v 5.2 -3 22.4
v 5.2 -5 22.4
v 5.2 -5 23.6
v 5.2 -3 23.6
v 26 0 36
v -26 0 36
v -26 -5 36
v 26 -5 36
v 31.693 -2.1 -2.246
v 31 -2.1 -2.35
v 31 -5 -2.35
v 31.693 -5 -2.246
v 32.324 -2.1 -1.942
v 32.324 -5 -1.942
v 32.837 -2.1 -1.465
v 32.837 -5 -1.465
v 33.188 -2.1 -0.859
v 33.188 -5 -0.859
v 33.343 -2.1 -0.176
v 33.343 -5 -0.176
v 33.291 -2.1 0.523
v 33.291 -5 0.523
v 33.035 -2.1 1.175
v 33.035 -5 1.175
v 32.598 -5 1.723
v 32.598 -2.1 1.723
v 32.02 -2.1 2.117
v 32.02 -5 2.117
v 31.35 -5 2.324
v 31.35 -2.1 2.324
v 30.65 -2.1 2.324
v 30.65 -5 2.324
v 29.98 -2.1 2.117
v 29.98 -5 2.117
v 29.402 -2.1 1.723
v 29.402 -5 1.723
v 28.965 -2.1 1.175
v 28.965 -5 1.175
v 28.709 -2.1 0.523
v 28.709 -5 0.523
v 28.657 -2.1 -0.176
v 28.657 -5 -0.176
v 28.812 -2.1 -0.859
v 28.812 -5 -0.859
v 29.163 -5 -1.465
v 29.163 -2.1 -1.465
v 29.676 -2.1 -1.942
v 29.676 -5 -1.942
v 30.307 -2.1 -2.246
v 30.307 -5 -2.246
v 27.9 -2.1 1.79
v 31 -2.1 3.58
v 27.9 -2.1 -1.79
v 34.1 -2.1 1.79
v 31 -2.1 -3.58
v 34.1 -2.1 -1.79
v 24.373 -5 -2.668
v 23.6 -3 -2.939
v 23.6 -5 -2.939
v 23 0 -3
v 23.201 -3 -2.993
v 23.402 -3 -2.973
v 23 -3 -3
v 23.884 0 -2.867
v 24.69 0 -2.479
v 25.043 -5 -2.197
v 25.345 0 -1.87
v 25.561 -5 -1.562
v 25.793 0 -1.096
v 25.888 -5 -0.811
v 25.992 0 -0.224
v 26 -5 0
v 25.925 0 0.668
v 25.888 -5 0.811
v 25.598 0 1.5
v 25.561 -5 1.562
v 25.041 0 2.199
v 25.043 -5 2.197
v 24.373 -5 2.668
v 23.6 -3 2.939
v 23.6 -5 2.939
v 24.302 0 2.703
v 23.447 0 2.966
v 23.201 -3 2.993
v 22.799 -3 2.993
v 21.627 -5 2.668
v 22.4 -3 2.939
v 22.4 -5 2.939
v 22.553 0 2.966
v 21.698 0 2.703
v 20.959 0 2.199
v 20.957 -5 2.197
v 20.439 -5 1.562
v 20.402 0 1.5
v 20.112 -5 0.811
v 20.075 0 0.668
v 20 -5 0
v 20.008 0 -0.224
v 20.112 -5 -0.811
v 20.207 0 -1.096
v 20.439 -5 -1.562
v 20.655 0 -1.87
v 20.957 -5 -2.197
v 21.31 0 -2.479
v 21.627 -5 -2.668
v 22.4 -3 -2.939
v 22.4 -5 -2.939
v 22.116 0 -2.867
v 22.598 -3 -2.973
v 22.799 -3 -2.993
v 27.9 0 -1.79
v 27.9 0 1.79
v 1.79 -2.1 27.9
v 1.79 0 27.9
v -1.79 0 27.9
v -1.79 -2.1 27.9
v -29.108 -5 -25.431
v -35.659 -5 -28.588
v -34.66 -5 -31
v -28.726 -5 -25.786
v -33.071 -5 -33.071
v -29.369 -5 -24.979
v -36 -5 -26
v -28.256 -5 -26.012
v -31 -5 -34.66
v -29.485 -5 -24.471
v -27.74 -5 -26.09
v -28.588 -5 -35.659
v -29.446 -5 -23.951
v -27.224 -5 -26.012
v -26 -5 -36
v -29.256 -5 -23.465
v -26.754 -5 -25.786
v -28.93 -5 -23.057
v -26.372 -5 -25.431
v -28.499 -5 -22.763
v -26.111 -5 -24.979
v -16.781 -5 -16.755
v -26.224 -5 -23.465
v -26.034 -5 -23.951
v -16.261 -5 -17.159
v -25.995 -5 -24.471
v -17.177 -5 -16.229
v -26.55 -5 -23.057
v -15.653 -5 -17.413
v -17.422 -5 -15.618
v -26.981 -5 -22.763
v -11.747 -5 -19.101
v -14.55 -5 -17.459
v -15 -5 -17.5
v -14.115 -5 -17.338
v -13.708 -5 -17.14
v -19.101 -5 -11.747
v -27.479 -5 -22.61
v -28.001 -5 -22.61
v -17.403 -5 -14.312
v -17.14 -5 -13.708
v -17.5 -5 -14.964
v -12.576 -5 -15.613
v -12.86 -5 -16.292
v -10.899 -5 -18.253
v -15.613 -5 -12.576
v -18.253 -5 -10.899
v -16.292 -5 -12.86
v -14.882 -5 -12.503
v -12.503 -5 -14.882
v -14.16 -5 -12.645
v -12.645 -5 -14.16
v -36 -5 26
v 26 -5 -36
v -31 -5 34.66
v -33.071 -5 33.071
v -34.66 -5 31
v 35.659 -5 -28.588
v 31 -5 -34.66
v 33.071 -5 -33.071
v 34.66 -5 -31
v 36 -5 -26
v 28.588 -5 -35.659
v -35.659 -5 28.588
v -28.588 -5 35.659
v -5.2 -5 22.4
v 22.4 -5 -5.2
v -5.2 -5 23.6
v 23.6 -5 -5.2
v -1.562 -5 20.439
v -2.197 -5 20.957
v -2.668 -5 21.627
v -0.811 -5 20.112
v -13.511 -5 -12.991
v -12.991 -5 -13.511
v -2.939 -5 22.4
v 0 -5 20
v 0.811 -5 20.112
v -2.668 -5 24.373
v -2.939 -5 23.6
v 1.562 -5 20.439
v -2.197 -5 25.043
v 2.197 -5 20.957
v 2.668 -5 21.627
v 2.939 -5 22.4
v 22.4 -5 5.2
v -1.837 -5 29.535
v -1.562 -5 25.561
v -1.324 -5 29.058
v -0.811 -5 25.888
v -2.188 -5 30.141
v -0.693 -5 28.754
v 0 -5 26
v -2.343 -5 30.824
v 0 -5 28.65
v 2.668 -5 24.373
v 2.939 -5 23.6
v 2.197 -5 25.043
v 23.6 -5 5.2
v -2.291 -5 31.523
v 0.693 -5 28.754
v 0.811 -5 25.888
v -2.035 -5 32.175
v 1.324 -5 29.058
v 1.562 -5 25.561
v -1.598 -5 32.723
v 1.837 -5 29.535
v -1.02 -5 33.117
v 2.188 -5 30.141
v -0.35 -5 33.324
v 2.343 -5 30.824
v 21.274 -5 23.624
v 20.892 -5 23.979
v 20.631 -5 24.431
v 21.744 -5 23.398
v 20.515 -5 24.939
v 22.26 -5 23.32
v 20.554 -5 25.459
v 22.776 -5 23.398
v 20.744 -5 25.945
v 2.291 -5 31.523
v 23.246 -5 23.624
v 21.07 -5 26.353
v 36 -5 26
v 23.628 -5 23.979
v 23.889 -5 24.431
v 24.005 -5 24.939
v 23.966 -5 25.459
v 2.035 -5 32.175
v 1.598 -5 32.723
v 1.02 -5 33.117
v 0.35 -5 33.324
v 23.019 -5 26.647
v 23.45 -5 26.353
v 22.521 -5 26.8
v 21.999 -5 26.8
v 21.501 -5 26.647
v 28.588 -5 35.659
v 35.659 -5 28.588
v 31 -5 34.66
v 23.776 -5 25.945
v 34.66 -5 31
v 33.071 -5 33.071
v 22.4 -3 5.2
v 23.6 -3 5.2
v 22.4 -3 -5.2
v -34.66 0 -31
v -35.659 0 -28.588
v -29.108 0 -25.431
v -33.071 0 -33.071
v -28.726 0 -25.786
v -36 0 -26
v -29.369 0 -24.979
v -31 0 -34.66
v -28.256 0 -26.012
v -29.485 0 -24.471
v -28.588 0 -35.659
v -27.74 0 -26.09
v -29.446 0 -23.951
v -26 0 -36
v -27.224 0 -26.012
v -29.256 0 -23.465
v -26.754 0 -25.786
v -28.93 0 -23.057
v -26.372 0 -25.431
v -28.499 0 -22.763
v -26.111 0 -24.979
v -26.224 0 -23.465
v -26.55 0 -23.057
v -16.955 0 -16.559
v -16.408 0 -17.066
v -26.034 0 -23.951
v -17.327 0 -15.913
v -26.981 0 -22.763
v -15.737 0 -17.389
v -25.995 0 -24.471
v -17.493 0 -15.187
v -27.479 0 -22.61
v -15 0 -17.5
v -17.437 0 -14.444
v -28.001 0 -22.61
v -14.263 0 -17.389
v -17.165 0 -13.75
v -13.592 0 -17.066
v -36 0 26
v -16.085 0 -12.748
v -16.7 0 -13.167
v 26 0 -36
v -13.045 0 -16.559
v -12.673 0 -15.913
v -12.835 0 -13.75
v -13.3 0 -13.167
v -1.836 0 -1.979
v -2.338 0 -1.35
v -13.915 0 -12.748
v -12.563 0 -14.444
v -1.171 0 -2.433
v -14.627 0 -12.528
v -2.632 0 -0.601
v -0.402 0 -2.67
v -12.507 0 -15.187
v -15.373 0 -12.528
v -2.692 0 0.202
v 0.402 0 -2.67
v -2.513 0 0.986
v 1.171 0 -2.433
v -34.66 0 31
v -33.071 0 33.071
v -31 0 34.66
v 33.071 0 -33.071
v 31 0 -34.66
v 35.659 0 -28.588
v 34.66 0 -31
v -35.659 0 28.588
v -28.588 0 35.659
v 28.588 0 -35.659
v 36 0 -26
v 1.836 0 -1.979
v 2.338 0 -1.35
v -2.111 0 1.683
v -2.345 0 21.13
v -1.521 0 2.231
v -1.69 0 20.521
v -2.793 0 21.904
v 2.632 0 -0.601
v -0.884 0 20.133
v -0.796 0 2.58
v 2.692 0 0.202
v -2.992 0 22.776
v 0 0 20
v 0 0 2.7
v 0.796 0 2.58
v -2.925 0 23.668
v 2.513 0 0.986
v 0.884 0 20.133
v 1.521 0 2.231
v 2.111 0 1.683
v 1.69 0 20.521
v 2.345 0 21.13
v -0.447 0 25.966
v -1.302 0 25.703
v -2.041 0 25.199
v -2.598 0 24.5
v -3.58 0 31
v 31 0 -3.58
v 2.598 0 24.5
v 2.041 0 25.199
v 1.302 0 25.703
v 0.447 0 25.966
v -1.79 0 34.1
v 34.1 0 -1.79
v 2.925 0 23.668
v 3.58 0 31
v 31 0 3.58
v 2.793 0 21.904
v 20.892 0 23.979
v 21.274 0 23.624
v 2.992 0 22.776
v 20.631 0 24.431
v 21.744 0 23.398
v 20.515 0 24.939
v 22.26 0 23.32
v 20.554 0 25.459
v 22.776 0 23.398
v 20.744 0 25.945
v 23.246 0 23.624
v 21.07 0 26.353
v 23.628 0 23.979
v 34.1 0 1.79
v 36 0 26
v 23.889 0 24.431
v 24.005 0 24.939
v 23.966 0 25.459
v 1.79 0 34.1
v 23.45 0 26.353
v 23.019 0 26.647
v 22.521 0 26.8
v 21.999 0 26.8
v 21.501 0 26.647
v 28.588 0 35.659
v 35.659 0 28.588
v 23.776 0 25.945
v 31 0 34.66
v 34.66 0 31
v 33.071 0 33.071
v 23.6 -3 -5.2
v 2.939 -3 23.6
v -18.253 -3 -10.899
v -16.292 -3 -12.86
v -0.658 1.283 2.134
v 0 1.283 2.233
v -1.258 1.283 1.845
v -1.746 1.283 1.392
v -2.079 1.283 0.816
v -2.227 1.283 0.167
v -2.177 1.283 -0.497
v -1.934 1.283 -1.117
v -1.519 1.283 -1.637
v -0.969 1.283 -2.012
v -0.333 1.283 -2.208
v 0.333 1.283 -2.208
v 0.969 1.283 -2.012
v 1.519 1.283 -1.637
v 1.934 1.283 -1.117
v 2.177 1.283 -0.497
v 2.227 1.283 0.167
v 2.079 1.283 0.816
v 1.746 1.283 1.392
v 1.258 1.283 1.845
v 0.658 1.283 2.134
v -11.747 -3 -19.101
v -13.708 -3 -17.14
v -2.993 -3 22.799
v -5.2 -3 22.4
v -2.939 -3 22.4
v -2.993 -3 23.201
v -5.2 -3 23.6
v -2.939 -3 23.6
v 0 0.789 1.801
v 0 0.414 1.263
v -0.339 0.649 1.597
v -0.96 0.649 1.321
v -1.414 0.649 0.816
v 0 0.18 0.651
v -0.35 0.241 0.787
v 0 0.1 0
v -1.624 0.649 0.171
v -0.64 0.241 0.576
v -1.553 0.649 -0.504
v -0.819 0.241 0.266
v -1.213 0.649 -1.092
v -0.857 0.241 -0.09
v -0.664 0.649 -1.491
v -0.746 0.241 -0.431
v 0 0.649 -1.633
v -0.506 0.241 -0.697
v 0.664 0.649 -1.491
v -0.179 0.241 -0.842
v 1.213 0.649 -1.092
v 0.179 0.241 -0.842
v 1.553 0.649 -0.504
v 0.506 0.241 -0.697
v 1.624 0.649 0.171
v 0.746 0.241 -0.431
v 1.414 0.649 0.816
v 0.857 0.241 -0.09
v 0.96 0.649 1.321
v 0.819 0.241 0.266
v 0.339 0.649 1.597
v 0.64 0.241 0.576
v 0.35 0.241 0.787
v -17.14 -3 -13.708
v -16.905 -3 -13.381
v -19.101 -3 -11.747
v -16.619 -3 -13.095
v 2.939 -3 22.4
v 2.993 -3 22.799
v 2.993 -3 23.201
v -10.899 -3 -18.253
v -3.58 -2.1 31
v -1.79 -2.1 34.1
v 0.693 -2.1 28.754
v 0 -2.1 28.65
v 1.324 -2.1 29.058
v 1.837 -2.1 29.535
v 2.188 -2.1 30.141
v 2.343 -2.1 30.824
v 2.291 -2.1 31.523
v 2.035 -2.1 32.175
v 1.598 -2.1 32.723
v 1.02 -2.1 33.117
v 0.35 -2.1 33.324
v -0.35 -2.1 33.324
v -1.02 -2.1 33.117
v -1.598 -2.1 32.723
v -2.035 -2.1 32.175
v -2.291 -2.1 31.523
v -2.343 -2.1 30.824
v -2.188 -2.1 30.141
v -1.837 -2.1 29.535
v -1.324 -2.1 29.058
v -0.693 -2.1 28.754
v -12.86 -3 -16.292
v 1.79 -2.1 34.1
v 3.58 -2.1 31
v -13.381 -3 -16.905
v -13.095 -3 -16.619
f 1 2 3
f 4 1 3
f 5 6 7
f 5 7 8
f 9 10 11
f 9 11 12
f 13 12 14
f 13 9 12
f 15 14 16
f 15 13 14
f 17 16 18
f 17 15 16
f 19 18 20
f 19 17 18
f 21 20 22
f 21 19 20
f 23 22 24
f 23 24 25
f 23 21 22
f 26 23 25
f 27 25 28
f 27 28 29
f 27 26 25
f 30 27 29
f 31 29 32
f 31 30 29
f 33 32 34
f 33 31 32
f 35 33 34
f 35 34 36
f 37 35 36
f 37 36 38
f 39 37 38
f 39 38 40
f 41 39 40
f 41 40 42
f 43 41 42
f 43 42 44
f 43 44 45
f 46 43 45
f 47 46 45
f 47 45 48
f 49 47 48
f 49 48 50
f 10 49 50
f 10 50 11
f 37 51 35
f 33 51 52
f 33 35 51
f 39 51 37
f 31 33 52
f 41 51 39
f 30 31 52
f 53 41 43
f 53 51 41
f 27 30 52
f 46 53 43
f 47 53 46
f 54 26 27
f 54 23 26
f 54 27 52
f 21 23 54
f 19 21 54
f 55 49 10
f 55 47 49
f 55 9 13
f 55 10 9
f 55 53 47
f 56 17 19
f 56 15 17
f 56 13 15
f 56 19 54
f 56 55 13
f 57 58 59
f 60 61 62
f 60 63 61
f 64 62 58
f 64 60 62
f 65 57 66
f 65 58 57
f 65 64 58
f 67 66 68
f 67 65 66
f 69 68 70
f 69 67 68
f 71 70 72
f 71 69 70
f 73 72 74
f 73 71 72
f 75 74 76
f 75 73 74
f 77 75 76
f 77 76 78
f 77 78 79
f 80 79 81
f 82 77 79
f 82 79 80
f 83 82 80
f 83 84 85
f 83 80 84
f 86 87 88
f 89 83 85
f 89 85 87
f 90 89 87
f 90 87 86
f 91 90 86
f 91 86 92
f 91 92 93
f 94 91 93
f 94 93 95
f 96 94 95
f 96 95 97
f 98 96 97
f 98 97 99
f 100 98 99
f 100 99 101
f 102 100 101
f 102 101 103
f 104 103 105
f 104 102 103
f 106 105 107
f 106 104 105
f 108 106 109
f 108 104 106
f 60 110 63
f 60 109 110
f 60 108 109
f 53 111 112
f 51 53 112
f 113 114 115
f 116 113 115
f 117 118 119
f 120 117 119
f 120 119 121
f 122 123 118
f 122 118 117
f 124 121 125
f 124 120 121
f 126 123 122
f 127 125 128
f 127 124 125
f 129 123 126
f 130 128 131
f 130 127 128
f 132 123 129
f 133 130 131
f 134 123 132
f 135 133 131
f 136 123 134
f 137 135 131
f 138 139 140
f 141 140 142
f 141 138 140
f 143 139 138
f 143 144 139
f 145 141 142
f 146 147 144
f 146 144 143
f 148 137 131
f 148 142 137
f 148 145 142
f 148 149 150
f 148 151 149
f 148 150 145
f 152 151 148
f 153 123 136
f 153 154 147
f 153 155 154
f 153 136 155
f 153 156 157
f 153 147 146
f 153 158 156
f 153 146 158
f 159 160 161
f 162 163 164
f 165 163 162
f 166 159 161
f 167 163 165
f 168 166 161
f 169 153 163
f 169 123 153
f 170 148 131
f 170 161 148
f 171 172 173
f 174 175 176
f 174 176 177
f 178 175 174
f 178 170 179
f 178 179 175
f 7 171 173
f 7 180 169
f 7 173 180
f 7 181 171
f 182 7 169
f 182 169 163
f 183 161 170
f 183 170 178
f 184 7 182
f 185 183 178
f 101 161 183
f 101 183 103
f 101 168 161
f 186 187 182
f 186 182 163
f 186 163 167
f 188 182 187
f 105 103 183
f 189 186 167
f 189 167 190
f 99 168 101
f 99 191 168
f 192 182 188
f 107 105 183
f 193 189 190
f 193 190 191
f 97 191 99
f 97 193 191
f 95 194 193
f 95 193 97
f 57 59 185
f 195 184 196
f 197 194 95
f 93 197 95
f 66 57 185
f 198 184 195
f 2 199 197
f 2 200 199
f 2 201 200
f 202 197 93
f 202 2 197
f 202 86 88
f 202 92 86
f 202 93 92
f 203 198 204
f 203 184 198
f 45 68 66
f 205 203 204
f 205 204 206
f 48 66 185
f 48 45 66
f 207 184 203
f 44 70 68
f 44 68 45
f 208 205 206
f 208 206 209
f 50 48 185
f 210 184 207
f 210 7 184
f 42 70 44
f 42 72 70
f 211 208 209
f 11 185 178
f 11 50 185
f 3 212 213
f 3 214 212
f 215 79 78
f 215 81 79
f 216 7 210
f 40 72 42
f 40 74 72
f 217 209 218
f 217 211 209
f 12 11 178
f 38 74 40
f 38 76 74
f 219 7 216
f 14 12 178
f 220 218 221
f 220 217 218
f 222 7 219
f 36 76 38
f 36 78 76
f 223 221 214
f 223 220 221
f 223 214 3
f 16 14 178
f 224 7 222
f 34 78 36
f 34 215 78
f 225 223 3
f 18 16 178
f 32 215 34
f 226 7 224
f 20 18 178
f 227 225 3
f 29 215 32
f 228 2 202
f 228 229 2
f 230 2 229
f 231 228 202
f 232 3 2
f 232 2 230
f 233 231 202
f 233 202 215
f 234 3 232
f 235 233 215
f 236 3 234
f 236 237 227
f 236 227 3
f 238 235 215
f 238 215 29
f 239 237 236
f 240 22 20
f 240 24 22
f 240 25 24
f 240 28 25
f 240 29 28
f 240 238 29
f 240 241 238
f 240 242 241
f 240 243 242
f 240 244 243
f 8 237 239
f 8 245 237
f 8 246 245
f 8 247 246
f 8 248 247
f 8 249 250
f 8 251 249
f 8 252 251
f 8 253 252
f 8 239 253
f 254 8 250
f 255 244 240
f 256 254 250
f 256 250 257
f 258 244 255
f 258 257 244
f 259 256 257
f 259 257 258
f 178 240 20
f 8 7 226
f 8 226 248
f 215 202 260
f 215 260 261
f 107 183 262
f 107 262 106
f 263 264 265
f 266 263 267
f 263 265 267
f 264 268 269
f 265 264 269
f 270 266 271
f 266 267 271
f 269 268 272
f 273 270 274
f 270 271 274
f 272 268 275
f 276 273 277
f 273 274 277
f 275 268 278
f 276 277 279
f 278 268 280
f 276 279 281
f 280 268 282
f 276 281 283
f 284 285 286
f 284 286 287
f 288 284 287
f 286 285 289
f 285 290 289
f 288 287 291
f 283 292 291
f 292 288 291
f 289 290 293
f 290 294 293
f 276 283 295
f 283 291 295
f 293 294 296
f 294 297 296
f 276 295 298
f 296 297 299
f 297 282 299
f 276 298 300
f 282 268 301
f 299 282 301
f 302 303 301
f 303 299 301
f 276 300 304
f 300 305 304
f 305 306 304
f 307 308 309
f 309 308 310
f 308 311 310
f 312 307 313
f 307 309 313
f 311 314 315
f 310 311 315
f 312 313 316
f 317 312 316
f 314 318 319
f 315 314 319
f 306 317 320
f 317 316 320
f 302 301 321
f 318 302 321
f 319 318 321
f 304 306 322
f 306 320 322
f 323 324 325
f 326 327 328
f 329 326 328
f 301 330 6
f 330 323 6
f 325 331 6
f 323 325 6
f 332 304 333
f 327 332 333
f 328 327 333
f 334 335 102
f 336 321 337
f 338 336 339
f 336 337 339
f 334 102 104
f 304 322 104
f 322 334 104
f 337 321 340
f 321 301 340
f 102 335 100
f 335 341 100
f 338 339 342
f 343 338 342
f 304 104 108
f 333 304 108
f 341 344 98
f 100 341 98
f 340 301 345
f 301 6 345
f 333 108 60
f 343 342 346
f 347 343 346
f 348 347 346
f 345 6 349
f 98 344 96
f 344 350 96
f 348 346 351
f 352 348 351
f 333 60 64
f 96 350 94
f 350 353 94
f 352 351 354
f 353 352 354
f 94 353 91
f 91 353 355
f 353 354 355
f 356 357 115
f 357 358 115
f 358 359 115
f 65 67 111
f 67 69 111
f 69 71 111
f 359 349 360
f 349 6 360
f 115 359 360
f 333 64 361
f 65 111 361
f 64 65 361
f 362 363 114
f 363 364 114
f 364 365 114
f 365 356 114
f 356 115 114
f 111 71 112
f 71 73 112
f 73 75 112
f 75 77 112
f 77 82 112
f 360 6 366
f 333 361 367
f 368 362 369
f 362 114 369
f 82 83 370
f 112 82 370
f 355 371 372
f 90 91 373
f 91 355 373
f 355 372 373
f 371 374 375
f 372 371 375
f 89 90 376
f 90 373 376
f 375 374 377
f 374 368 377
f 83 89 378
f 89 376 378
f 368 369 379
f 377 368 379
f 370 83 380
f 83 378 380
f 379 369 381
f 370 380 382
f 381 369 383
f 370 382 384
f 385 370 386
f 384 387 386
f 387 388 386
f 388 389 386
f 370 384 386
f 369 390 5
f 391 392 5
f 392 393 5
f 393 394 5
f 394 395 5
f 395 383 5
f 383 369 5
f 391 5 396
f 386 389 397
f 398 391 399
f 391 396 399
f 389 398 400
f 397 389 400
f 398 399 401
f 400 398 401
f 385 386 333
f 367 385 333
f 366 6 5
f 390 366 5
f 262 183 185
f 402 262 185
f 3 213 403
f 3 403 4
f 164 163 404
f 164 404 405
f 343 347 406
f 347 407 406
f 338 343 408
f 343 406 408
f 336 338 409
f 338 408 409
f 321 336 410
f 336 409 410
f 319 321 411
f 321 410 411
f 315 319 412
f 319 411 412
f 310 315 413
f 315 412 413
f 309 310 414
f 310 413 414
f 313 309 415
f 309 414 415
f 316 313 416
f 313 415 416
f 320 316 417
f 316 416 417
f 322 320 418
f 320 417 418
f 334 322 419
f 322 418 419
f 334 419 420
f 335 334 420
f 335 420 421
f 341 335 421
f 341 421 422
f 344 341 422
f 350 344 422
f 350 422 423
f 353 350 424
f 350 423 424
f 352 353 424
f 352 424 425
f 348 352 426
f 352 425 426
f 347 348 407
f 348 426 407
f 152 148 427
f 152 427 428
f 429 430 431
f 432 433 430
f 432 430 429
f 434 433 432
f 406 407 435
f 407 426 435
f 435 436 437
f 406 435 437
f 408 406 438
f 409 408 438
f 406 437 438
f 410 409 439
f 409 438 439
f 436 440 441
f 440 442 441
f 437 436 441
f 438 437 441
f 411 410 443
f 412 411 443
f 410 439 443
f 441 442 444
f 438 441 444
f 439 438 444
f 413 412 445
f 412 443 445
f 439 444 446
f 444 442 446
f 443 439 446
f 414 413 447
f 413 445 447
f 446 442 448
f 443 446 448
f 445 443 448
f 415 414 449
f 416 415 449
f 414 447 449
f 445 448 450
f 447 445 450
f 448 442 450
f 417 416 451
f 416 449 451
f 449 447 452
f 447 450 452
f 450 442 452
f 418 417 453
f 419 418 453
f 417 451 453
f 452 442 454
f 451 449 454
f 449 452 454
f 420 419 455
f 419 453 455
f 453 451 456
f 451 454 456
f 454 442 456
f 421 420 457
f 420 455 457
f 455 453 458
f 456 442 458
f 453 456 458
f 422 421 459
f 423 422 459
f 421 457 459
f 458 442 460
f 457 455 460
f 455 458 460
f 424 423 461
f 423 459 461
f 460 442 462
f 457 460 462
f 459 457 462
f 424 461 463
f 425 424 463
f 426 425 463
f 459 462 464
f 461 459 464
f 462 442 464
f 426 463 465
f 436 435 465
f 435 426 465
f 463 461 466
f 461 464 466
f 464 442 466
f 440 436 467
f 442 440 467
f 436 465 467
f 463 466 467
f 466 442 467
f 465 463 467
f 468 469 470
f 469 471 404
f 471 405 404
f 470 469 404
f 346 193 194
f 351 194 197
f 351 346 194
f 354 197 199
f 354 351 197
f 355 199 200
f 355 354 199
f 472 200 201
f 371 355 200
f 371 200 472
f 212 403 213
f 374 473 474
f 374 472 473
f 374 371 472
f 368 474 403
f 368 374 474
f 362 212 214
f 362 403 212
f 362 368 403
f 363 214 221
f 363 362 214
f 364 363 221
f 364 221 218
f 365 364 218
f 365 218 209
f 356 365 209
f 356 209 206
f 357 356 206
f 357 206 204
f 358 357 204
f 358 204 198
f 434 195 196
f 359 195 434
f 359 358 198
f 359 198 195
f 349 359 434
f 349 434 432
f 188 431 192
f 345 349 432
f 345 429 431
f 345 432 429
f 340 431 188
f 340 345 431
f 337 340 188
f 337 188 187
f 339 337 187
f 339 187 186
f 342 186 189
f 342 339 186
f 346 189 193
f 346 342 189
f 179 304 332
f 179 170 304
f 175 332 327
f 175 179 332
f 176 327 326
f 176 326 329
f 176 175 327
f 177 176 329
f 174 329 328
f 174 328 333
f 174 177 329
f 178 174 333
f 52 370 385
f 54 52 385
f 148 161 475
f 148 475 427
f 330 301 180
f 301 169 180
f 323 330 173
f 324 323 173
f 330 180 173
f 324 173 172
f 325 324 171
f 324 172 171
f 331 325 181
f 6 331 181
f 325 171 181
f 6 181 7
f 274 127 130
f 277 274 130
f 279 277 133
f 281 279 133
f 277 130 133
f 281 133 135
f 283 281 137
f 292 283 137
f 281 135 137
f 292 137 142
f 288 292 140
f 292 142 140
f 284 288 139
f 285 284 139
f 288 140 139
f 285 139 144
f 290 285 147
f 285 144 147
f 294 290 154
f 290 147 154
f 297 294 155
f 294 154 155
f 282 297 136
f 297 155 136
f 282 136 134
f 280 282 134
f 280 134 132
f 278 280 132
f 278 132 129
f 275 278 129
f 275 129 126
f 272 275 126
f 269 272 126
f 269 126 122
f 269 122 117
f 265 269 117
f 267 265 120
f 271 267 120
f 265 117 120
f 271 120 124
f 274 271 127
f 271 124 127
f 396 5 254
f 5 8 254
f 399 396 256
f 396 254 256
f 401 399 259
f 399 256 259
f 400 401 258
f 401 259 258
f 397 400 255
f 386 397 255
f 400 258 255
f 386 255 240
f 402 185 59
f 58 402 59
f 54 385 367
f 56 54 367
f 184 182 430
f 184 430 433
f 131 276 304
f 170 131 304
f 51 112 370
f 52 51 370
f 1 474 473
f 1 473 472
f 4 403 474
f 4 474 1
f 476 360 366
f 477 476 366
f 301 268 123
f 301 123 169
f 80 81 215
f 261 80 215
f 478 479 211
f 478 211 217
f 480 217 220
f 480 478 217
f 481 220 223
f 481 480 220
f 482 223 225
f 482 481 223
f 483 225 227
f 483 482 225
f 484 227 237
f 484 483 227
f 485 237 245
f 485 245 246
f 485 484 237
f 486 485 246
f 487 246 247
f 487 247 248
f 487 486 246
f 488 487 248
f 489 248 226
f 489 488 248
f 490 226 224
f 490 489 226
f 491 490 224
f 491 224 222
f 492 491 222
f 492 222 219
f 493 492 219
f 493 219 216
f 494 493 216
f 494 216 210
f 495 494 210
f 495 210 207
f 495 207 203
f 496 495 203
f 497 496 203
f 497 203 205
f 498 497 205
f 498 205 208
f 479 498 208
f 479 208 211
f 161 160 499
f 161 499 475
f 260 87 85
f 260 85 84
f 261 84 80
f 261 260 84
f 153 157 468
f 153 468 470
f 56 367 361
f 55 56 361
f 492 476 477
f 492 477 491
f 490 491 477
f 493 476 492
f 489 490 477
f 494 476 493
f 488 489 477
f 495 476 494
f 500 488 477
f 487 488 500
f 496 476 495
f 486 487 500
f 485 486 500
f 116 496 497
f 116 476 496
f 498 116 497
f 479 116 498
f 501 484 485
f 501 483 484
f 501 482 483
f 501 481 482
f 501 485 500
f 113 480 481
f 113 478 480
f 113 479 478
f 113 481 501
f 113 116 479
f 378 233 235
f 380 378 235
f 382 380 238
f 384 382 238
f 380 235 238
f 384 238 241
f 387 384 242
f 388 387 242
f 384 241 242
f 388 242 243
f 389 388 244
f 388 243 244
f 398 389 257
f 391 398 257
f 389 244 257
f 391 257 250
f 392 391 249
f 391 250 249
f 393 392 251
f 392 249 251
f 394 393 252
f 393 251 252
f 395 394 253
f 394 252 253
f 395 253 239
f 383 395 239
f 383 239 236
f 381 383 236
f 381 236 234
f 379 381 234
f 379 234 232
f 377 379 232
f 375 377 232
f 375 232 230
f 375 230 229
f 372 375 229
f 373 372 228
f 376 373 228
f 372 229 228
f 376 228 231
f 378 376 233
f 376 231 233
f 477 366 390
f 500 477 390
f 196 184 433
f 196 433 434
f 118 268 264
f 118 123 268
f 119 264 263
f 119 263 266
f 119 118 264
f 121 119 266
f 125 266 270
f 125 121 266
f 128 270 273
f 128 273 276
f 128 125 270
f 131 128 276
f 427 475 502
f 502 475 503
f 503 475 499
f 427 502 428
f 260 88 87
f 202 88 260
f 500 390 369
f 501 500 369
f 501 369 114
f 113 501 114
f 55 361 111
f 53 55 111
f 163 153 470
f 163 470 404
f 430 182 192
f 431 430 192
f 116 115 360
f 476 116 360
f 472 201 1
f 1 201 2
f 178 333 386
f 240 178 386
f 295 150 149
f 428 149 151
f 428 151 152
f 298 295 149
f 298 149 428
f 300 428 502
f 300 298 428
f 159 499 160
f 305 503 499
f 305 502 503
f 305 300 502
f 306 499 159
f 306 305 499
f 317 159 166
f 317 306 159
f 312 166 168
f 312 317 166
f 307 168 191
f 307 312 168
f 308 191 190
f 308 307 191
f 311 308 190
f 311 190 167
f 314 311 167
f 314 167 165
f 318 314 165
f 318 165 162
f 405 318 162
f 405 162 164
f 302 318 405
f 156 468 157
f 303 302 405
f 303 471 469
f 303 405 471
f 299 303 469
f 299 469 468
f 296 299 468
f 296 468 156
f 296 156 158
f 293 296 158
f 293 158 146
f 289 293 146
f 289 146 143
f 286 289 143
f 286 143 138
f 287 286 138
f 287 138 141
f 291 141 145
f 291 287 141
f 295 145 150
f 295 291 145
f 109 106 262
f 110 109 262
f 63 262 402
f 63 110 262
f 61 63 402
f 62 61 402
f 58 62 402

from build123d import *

# Parameters (mm, degrees)
SKETCH4_W           = 72
SKETCH4_H           = 72
SKETCH4_R           = 3
SKETCH4_R_2         = 2.5
SKETCH4_R_3         = 2.35
BOSS_EXTRUDE2_DEPTH = 5
SKETCH5_W           = 10.4
SKETCH5_H           = 1.2
SKETCH5_W_2         = 1.2
SKETCH5_H_2         = 10.4
CUT_EXTRUDE1_DEPTH  = 2
CUT_EXTRUDE2_DEPTH  = 2.1
FILLET1_R           = 10
SKETCH7_R           = 1.75
CUT_EXTRUDE3_DEPTH  = 5
SKETCH8_R           = 1.75
CUT_EXTRUDE4_DEPTH  = 5


with BuildPart() as part:
    # Sketch3 → Revolve1 (revolve)
    with BuildSketch(Plane.XY, mode=Mode.PRIVATE) as revolve1_sk:
        with BuildLine():
            Line((0, 0), (2.7, 0))
            Line((2.7, 0), (2.233206222, 1.282505364))
            ThreePointArc((2.233206222, 1.282505364), (1.26348021, 0.413869711), (0, 0.1))
            Line((0, 0.1), (0, 0))
        make_face()
    revolve(revolve1_sk.sketch.rotate(Axis((0, 0.1, 0), (0, -1, 0)), 90), axis=Axis((0, 0.1, 0), (0, -1, 0)))

    # Sketch4 → Boss-Extrude2 (add)
    with BuildSketch(Plane.XZ):
        Rectangle(SKETCH4_W, SKETCH4_H)
        with Locations(Location((23, 0, 0), (0, 0, 270))):
            Circle(SKETCH4_R, mode=Mode.SUBTRACT)
        with Locations(Location((0, 23, 0), (0, 0, 270))):
            Circle(SKETCH4_R, mode=Mode.SUBTRACT)
        with Locations(Location((-15, -15, 0), (0, 0, 270))):
            Circle(SKETCH4_R_2, mode=Mode.SUBTRACT)
        with Locations(Location((0, 31, 0), (0, 0, 270))):
            Circle(SKETCH4_R_3, mode=Mode.SUBTRACT)
        with Locations(Location((31, 0, 0), (0, 0, 270))):
            Circle(SKETCH4_R_3, mode=Mode.SUBTRACT)
    extrude(amount=BOSS_EXTRUDE2_DEPTH)

    # Sketch5 → Cut-Extrude1 (cut)
    with BuildSketch(Plane.XZ.offset(5)):
        with Locations((0, 23)):
            Rectangle(SKETCH5_W, SKETCH5_H)
        with Locations((23, 0)):
            Rectangle(SKETCH5_W_2, SKETCH5_H_2)
        Polygon((-18.252691193, -10.898780669), (-10.898780669, -18.252691193), (-11.747308807, -19.101219331), (-19.101219331, -11.747308807), align=None)
    extrude(amount=-CUT_EXTRUDE1_DEPTH, mode=Mode.SUBTRACT)

    # Sketch6 → Cut-Extrude2 (cut)
    with BuildSketch(Plane(origin=(0, 0, 0), x_dir=(1, 0, 0), z_dir=(0, 1, 0))):
        Polygon((1.789785834, -27.9), (-1.789785834, -27.9), (-3.579571669, -31), (-1.789785834, -34.1), (1.789785834, -34.1), (3.579571669, -31), align=None)
        Polygon((34.1, 1.789785834), (31, 3.579571669), (27.9, 1.789785834), (27.9, -1.789785834), (31, -3.579571669), (34.1, -1.789785834), align=None)
    extrude(amount=-CUT_EXTRUDE2_DEPTH, mode=Mode.SUBTRACT)

    # Fillet1
    fillet1_edges = [part.edges().sort_by_distance(p)[0] for p in [
        (36, -2.5, -36),
        (36, -2.5, 36),
        (-36, -2.5, 36),
        (-36, -2.5, -36),
    ]]
    fillet(fillet1_edges, radius=FILLET1_R)

    # Sketch7 → Cut-Extrude3 (cut)
    with BuildSketch(Plane.XZ.offset(5)):
        with Locations(Location((22.26, 25.07, 0), (0, 0, 270))):
            Circle(SKETCH7_R)
    extrude(amount=-CUT_EXTRUDE3_DEPTH, mode=Mode.SUBTRACT)

    # Sketch8 → Cut-Extrude4 (cut)
    with BuildSketch(Plane.XZ.offset(5)):
        with Locations(Location((-27.74, -24.34, 0), (0, 0, 270))):
            Circle(SKETCH8_R)
    extrude(amount=-CUT_EXTRUDE4_DEPTH, mode=Mode.SUBTRACT)


solid = part.part
